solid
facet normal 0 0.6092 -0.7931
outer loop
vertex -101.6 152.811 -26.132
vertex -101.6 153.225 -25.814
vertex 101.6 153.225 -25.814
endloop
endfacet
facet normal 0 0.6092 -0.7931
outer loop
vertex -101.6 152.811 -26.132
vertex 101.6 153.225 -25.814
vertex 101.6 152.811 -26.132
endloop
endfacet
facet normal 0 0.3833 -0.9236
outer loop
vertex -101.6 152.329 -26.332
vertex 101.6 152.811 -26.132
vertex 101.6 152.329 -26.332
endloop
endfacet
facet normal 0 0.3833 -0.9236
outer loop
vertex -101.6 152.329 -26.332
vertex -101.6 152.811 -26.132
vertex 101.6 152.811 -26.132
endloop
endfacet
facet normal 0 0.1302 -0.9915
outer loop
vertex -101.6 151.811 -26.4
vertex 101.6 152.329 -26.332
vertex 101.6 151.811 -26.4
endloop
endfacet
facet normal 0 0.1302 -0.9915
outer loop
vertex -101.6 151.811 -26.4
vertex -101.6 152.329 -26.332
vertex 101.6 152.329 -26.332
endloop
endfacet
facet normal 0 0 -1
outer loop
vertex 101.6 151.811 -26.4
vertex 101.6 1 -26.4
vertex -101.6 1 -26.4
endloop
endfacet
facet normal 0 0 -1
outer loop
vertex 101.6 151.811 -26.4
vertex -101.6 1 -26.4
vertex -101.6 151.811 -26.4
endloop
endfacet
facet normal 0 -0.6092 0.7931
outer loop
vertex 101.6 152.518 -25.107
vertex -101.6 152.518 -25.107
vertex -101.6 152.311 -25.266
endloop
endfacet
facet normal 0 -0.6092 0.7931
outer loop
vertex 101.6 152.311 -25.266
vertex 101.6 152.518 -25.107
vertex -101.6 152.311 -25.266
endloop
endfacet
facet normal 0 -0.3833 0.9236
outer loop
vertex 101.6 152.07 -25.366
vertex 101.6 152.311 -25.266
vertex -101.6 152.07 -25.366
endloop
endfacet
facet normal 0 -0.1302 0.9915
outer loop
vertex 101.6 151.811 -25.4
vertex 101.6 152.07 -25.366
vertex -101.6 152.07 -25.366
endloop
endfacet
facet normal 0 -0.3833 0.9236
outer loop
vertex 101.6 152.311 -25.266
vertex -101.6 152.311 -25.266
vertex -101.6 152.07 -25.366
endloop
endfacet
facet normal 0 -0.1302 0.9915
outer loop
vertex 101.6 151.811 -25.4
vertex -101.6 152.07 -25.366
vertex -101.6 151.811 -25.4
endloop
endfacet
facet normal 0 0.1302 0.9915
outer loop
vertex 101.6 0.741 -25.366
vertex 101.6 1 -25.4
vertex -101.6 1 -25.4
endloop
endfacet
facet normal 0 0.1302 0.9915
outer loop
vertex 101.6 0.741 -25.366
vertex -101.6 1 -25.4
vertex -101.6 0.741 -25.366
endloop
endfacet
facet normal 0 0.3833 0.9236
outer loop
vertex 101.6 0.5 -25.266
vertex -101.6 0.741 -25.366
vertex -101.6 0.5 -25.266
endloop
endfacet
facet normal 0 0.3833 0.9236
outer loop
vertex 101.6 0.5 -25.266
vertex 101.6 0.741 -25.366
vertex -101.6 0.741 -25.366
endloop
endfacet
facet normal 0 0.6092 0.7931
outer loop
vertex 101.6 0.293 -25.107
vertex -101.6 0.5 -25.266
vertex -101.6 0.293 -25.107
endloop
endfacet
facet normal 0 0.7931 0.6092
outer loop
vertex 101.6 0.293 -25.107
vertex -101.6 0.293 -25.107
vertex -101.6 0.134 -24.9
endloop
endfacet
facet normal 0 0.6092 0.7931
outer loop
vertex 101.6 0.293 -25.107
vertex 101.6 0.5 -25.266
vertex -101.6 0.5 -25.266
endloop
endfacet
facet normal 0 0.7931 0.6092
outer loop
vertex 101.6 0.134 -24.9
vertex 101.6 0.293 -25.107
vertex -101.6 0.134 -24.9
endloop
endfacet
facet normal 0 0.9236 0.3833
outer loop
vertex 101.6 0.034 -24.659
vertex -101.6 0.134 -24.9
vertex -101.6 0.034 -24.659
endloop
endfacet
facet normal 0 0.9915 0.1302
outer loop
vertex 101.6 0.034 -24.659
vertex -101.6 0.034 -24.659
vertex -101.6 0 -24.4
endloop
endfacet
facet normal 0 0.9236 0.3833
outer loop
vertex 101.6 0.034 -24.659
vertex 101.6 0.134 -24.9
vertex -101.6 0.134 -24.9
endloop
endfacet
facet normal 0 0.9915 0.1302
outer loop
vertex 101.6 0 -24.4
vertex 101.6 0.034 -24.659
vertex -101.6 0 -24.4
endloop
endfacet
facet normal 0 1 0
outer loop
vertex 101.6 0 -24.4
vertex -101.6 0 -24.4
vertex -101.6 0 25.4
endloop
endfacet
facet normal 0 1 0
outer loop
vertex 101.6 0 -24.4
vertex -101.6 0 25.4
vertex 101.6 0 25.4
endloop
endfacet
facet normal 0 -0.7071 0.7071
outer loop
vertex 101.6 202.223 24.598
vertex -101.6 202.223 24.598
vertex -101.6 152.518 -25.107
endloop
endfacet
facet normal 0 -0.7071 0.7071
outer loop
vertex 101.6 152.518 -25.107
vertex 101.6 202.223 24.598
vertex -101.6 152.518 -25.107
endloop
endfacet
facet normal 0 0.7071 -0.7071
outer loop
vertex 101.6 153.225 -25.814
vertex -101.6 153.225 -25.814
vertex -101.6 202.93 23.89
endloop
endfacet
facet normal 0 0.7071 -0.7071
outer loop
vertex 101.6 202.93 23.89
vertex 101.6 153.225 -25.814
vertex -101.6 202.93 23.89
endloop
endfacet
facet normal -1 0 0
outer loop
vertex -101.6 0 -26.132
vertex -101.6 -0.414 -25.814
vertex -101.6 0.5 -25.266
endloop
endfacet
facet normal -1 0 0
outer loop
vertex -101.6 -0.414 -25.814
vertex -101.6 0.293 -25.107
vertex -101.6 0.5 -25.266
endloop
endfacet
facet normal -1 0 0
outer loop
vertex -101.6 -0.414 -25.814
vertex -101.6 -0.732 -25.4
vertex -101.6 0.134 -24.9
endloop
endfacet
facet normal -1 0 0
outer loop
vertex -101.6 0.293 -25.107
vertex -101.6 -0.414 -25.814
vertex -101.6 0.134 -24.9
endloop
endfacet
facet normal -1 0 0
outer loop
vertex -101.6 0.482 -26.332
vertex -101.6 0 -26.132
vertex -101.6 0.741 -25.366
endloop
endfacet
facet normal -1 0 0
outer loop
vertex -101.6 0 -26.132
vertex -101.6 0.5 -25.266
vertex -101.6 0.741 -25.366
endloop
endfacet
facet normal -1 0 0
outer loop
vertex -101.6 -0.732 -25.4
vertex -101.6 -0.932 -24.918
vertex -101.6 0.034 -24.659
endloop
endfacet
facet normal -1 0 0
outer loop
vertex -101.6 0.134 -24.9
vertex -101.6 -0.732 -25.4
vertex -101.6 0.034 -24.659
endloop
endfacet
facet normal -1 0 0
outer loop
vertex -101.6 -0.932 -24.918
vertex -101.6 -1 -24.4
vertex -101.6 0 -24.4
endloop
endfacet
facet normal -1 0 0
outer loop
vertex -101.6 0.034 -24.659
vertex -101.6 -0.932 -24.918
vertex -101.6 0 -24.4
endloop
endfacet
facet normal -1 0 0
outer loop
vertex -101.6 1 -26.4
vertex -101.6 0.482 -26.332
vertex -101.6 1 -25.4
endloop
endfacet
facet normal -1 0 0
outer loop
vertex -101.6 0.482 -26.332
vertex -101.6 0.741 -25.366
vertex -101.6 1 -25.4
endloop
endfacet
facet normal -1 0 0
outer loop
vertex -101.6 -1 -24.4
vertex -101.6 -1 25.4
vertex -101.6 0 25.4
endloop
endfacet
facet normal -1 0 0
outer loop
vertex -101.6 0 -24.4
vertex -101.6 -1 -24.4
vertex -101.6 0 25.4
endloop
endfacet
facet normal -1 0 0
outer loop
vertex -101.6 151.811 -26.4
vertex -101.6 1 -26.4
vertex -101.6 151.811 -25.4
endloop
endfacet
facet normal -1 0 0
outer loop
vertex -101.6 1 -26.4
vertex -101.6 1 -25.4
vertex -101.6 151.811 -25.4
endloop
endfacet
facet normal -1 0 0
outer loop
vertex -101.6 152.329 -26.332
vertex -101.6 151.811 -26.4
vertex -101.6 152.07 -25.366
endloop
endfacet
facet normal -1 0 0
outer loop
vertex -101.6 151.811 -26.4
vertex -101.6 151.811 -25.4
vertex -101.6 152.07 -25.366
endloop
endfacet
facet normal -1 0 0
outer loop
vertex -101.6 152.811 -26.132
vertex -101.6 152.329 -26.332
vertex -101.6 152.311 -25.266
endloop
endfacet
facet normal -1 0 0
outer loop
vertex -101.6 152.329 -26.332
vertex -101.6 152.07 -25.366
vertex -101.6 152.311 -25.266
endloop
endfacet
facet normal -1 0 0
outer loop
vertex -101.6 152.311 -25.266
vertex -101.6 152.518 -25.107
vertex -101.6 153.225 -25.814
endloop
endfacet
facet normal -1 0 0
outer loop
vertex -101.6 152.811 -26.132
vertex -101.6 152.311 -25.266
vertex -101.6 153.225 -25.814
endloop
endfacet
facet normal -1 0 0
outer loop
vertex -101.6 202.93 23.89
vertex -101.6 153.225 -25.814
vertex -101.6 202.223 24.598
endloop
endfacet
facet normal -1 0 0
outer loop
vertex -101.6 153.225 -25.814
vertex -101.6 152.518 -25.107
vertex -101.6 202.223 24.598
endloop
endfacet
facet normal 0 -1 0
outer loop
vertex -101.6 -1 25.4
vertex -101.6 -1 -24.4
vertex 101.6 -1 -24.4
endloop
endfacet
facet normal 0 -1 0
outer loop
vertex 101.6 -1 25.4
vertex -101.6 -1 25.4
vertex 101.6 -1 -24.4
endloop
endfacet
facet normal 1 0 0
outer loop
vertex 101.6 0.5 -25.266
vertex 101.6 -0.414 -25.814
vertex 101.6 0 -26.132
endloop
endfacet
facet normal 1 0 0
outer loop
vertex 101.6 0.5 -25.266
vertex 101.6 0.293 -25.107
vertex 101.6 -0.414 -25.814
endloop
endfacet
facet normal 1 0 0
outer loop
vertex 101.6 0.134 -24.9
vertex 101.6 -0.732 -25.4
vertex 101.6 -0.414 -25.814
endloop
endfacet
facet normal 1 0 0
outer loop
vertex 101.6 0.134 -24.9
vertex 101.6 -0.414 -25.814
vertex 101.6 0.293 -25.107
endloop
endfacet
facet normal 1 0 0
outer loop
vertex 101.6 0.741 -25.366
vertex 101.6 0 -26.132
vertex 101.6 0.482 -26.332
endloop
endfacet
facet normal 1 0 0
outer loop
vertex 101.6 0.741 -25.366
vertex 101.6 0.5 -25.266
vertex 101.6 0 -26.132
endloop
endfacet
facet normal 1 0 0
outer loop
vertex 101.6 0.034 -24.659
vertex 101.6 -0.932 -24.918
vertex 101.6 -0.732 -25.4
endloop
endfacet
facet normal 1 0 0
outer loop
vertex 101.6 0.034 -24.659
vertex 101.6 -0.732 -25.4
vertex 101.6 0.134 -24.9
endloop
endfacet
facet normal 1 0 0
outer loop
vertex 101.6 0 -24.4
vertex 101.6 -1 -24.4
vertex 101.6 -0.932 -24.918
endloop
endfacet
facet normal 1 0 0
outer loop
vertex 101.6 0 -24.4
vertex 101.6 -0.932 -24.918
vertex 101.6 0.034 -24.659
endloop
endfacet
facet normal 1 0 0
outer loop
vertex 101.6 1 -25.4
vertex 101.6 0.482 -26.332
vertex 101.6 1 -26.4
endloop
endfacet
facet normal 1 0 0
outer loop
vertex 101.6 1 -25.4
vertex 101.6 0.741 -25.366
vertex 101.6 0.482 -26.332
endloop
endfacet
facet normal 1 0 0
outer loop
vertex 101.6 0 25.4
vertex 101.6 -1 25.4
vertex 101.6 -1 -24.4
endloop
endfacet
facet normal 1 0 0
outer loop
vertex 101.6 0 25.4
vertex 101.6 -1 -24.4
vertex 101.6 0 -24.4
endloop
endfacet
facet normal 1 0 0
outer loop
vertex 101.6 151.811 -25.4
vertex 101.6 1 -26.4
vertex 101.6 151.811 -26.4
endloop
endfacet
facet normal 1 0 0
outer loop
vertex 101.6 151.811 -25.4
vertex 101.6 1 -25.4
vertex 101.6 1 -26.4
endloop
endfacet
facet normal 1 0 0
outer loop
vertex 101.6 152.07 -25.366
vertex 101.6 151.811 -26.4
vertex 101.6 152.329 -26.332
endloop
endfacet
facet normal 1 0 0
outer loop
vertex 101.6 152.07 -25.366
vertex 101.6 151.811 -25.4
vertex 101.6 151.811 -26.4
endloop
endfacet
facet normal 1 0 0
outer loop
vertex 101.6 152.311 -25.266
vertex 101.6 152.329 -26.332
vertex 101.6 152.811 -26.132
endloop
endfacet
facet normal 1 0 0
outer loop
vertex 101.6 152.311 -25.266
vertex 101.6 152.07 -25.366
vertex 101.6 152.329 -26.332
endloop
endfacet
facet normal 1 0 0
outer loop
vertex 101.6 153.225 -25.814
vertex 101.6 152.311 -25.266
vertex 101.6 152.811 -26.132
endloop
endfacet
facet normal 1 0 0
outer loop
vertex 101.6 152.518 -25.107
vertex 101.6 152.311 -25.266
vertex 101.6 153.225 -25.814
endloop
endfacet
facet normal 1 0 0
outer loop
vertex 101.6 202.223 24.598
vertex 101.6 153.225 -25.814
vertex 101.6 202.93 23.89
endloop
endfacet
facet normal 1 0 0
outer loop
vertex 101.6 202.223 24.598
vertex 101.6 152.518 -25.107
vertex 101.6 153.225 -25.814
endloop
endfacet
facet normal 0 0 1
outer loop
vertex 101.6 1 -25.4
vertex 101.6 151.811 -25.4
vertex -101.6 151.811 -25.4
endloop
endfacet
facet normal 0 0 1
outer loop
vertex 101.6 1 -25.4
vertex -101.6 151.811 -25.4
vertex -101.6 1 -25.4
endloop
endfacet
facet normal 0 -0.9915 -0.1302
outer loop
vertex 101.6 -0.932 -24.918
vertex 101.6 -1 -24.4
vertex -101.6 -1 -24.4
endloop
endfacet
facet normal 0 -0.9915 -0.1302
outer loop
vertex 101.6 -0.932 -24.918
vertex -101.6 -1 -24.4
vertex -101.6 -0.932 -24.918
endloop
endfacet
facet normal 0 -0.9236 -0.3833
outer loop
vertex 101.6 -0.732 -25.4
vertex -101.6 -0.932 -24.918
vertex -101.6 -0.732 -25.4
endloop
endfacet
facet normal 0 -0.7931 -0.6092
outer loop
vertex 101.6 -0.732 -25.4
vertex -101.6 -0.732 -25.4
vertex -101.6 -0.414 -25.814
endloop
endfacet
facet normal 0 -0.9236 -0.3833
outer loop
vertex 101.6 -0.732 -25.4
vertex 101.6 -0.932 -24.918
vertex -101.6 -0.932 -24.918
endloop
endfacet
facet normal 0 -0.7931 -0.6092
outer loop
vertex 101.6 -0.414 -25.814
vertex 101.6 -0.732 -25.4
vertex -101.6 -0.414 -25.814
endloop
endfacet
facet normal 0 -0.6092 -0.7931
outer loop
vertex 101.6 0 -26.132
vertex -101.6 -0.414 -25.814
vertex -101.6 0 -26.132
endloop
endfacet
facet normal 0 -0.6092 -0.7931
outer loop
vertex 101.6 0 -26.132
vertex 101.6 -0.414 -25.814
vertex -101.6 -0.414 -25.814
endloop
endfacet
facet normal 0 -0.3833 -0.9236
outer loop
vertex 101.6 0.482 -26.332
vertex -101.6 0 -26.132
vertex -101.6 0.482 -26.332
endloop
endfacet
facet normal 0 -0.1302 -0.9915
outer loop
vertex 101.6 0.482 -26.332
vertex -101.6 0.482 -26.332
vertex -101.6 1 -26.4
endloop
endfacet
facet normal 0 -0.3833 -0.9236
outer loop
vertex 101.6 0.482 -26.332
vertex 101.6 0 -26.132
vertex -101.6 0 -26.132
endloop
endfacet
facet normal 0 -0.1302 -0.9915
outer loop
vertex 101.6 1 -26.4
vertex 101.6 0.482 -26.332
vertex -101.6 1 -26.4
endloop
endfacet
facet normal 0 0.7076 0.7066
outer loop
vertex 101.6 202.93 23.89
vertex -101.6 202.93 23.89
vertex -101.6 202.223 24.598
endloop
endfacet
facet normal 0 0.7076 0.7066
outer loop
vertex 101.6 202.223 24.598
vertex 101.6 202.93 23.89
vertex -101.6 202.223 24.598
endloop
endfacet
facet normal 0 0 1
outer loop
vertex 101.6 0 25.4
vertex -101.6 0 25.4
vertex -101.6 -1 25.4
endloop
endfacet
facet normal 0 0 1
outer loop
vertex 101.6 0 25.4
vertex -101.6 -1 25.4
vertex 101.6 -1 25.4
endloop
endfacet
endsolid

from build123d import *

# Parameters (mm, degrees)
SKETCH22_W                   = 203.2
SKETCH22_H                   = 50.8
BASE_FLANGE2_DEPTH           = 1
EDGE_FLANGE3_STRIP_W         = 7
EDGE_FLANGE3_STRIP_H         = 1
EDGE_FLANGE3_STRIP_CUT_DEPTH = 203.2
EDGE_FLANGE3_DEPTH           = 203.2
SKETCHED_START               = -101.6
SKETCHED_BEND2_DEPTH         = 203.2
SKETCHED_BEND2_2_DEPTH       = 203.2


# Read off the part's stored shape, not the designer's step: Sketched Bend2
# Sheet-metal steps are written as plain solids
with BuildPart() as part:
    # Sketch22 → Base-Flange2 (new body)
    with BuildSketch(Plane(origin=(0, 0, 0), x_dir=(1, 0, 0), z_dir=(0, 1, 0))):
        Rectangle(SKETCH22_W, SKETCH22_H)
    extrude(amount=-BASE_FLANGE2_DEPTH)

    # Edge-Flange3 strip (across the edge) → Edge-Flange3 strip cut (cut)
    with BuildSketch(Plane(origin=(101.6, 0, -26.4), x_dir=(0, 0, 1), z_dir=(-1, 0, 0))):
        with Locations((-1.5, -0.5)):
            Rectangle(EDGE_FLANGE3_STRIP_W, EDGE_FLANGE3_STRIP_H)
    extrude(amount=EDGE_FLANGE3_STRIP_CUT_DEPTH, mode=Mode.SUBTRACT)

    # Edge-Flange3 section (across the edge) → Edge-Flange3 (add)
    with BuildSketch(Plane(origin=(101.6, 0, -26.4), x_dir=(0, 0, 1), z_dir=(-1, 0, 0))):
        with BuildLine():
            Line((0, 1), (0, 223.282))
            Line((0, 223.282), (1, 223.282))
            Line((1, 223.282), (1, 1))
            ThreePointArc((1, 1), (1.292893219, 0.292893219), (2, 0))
            Line((2, 0), (2, -1))
            ThreePointArc((2, -1), (0.585786438, -0.414213562), (0, 1))
        make_face()
    extrude(amount=EDGE_FLANGE3_DEPTH)

    # Sketched Bend2 outline → Sketched Bend2 (cut)
    with BuildSketch(Plane.YZ.offset(SKETCHED_START)):
        with BuildLine():
            ThreePointArc((153.22516494, -25.814213562), (152.576318242, -26.247759065), (151.810951377, -26.4))
            Line((151.810951377, -26.4), (223.282, -26.4))
            Line((223.282, -26.4), (223.282, -25.4))
            Line((223.282, -25.4), (153.639378502, -25.4))
            Line((153.639378502, -25.4), (153.22516494, -25.814213562))
        make_face()
    extrude(amount=SKETCHED_BEND2_DEPTH, mode=Mode.SUBTRACT)

    # Sketched Bend2 2 outline → Sketched Bend2 2 (add)
    with BuildSketch(Plane.YZ.offset(SKETCHED_START)):
        with BuildLine():
            Line((151.810951377, -25.4), (153.639378502, -25.4))
            Line((153.639378502, -25.4), (202.929787528, 23.890409026))
            Line((202.929787528, 23.890409026), (202.222680747, 24.597515807))
            Line((202.222680747, 24.597515807), (152.518058159, -25.107106781))
            ThreePointArc((152.518058159, -25.107106781), (152.19363481, -25.323879533), (151.810951377, -25.4))
        make_face()
    extrude(amount=SKETCHED_BEND2_2_DEPTH)


solid = part.part
